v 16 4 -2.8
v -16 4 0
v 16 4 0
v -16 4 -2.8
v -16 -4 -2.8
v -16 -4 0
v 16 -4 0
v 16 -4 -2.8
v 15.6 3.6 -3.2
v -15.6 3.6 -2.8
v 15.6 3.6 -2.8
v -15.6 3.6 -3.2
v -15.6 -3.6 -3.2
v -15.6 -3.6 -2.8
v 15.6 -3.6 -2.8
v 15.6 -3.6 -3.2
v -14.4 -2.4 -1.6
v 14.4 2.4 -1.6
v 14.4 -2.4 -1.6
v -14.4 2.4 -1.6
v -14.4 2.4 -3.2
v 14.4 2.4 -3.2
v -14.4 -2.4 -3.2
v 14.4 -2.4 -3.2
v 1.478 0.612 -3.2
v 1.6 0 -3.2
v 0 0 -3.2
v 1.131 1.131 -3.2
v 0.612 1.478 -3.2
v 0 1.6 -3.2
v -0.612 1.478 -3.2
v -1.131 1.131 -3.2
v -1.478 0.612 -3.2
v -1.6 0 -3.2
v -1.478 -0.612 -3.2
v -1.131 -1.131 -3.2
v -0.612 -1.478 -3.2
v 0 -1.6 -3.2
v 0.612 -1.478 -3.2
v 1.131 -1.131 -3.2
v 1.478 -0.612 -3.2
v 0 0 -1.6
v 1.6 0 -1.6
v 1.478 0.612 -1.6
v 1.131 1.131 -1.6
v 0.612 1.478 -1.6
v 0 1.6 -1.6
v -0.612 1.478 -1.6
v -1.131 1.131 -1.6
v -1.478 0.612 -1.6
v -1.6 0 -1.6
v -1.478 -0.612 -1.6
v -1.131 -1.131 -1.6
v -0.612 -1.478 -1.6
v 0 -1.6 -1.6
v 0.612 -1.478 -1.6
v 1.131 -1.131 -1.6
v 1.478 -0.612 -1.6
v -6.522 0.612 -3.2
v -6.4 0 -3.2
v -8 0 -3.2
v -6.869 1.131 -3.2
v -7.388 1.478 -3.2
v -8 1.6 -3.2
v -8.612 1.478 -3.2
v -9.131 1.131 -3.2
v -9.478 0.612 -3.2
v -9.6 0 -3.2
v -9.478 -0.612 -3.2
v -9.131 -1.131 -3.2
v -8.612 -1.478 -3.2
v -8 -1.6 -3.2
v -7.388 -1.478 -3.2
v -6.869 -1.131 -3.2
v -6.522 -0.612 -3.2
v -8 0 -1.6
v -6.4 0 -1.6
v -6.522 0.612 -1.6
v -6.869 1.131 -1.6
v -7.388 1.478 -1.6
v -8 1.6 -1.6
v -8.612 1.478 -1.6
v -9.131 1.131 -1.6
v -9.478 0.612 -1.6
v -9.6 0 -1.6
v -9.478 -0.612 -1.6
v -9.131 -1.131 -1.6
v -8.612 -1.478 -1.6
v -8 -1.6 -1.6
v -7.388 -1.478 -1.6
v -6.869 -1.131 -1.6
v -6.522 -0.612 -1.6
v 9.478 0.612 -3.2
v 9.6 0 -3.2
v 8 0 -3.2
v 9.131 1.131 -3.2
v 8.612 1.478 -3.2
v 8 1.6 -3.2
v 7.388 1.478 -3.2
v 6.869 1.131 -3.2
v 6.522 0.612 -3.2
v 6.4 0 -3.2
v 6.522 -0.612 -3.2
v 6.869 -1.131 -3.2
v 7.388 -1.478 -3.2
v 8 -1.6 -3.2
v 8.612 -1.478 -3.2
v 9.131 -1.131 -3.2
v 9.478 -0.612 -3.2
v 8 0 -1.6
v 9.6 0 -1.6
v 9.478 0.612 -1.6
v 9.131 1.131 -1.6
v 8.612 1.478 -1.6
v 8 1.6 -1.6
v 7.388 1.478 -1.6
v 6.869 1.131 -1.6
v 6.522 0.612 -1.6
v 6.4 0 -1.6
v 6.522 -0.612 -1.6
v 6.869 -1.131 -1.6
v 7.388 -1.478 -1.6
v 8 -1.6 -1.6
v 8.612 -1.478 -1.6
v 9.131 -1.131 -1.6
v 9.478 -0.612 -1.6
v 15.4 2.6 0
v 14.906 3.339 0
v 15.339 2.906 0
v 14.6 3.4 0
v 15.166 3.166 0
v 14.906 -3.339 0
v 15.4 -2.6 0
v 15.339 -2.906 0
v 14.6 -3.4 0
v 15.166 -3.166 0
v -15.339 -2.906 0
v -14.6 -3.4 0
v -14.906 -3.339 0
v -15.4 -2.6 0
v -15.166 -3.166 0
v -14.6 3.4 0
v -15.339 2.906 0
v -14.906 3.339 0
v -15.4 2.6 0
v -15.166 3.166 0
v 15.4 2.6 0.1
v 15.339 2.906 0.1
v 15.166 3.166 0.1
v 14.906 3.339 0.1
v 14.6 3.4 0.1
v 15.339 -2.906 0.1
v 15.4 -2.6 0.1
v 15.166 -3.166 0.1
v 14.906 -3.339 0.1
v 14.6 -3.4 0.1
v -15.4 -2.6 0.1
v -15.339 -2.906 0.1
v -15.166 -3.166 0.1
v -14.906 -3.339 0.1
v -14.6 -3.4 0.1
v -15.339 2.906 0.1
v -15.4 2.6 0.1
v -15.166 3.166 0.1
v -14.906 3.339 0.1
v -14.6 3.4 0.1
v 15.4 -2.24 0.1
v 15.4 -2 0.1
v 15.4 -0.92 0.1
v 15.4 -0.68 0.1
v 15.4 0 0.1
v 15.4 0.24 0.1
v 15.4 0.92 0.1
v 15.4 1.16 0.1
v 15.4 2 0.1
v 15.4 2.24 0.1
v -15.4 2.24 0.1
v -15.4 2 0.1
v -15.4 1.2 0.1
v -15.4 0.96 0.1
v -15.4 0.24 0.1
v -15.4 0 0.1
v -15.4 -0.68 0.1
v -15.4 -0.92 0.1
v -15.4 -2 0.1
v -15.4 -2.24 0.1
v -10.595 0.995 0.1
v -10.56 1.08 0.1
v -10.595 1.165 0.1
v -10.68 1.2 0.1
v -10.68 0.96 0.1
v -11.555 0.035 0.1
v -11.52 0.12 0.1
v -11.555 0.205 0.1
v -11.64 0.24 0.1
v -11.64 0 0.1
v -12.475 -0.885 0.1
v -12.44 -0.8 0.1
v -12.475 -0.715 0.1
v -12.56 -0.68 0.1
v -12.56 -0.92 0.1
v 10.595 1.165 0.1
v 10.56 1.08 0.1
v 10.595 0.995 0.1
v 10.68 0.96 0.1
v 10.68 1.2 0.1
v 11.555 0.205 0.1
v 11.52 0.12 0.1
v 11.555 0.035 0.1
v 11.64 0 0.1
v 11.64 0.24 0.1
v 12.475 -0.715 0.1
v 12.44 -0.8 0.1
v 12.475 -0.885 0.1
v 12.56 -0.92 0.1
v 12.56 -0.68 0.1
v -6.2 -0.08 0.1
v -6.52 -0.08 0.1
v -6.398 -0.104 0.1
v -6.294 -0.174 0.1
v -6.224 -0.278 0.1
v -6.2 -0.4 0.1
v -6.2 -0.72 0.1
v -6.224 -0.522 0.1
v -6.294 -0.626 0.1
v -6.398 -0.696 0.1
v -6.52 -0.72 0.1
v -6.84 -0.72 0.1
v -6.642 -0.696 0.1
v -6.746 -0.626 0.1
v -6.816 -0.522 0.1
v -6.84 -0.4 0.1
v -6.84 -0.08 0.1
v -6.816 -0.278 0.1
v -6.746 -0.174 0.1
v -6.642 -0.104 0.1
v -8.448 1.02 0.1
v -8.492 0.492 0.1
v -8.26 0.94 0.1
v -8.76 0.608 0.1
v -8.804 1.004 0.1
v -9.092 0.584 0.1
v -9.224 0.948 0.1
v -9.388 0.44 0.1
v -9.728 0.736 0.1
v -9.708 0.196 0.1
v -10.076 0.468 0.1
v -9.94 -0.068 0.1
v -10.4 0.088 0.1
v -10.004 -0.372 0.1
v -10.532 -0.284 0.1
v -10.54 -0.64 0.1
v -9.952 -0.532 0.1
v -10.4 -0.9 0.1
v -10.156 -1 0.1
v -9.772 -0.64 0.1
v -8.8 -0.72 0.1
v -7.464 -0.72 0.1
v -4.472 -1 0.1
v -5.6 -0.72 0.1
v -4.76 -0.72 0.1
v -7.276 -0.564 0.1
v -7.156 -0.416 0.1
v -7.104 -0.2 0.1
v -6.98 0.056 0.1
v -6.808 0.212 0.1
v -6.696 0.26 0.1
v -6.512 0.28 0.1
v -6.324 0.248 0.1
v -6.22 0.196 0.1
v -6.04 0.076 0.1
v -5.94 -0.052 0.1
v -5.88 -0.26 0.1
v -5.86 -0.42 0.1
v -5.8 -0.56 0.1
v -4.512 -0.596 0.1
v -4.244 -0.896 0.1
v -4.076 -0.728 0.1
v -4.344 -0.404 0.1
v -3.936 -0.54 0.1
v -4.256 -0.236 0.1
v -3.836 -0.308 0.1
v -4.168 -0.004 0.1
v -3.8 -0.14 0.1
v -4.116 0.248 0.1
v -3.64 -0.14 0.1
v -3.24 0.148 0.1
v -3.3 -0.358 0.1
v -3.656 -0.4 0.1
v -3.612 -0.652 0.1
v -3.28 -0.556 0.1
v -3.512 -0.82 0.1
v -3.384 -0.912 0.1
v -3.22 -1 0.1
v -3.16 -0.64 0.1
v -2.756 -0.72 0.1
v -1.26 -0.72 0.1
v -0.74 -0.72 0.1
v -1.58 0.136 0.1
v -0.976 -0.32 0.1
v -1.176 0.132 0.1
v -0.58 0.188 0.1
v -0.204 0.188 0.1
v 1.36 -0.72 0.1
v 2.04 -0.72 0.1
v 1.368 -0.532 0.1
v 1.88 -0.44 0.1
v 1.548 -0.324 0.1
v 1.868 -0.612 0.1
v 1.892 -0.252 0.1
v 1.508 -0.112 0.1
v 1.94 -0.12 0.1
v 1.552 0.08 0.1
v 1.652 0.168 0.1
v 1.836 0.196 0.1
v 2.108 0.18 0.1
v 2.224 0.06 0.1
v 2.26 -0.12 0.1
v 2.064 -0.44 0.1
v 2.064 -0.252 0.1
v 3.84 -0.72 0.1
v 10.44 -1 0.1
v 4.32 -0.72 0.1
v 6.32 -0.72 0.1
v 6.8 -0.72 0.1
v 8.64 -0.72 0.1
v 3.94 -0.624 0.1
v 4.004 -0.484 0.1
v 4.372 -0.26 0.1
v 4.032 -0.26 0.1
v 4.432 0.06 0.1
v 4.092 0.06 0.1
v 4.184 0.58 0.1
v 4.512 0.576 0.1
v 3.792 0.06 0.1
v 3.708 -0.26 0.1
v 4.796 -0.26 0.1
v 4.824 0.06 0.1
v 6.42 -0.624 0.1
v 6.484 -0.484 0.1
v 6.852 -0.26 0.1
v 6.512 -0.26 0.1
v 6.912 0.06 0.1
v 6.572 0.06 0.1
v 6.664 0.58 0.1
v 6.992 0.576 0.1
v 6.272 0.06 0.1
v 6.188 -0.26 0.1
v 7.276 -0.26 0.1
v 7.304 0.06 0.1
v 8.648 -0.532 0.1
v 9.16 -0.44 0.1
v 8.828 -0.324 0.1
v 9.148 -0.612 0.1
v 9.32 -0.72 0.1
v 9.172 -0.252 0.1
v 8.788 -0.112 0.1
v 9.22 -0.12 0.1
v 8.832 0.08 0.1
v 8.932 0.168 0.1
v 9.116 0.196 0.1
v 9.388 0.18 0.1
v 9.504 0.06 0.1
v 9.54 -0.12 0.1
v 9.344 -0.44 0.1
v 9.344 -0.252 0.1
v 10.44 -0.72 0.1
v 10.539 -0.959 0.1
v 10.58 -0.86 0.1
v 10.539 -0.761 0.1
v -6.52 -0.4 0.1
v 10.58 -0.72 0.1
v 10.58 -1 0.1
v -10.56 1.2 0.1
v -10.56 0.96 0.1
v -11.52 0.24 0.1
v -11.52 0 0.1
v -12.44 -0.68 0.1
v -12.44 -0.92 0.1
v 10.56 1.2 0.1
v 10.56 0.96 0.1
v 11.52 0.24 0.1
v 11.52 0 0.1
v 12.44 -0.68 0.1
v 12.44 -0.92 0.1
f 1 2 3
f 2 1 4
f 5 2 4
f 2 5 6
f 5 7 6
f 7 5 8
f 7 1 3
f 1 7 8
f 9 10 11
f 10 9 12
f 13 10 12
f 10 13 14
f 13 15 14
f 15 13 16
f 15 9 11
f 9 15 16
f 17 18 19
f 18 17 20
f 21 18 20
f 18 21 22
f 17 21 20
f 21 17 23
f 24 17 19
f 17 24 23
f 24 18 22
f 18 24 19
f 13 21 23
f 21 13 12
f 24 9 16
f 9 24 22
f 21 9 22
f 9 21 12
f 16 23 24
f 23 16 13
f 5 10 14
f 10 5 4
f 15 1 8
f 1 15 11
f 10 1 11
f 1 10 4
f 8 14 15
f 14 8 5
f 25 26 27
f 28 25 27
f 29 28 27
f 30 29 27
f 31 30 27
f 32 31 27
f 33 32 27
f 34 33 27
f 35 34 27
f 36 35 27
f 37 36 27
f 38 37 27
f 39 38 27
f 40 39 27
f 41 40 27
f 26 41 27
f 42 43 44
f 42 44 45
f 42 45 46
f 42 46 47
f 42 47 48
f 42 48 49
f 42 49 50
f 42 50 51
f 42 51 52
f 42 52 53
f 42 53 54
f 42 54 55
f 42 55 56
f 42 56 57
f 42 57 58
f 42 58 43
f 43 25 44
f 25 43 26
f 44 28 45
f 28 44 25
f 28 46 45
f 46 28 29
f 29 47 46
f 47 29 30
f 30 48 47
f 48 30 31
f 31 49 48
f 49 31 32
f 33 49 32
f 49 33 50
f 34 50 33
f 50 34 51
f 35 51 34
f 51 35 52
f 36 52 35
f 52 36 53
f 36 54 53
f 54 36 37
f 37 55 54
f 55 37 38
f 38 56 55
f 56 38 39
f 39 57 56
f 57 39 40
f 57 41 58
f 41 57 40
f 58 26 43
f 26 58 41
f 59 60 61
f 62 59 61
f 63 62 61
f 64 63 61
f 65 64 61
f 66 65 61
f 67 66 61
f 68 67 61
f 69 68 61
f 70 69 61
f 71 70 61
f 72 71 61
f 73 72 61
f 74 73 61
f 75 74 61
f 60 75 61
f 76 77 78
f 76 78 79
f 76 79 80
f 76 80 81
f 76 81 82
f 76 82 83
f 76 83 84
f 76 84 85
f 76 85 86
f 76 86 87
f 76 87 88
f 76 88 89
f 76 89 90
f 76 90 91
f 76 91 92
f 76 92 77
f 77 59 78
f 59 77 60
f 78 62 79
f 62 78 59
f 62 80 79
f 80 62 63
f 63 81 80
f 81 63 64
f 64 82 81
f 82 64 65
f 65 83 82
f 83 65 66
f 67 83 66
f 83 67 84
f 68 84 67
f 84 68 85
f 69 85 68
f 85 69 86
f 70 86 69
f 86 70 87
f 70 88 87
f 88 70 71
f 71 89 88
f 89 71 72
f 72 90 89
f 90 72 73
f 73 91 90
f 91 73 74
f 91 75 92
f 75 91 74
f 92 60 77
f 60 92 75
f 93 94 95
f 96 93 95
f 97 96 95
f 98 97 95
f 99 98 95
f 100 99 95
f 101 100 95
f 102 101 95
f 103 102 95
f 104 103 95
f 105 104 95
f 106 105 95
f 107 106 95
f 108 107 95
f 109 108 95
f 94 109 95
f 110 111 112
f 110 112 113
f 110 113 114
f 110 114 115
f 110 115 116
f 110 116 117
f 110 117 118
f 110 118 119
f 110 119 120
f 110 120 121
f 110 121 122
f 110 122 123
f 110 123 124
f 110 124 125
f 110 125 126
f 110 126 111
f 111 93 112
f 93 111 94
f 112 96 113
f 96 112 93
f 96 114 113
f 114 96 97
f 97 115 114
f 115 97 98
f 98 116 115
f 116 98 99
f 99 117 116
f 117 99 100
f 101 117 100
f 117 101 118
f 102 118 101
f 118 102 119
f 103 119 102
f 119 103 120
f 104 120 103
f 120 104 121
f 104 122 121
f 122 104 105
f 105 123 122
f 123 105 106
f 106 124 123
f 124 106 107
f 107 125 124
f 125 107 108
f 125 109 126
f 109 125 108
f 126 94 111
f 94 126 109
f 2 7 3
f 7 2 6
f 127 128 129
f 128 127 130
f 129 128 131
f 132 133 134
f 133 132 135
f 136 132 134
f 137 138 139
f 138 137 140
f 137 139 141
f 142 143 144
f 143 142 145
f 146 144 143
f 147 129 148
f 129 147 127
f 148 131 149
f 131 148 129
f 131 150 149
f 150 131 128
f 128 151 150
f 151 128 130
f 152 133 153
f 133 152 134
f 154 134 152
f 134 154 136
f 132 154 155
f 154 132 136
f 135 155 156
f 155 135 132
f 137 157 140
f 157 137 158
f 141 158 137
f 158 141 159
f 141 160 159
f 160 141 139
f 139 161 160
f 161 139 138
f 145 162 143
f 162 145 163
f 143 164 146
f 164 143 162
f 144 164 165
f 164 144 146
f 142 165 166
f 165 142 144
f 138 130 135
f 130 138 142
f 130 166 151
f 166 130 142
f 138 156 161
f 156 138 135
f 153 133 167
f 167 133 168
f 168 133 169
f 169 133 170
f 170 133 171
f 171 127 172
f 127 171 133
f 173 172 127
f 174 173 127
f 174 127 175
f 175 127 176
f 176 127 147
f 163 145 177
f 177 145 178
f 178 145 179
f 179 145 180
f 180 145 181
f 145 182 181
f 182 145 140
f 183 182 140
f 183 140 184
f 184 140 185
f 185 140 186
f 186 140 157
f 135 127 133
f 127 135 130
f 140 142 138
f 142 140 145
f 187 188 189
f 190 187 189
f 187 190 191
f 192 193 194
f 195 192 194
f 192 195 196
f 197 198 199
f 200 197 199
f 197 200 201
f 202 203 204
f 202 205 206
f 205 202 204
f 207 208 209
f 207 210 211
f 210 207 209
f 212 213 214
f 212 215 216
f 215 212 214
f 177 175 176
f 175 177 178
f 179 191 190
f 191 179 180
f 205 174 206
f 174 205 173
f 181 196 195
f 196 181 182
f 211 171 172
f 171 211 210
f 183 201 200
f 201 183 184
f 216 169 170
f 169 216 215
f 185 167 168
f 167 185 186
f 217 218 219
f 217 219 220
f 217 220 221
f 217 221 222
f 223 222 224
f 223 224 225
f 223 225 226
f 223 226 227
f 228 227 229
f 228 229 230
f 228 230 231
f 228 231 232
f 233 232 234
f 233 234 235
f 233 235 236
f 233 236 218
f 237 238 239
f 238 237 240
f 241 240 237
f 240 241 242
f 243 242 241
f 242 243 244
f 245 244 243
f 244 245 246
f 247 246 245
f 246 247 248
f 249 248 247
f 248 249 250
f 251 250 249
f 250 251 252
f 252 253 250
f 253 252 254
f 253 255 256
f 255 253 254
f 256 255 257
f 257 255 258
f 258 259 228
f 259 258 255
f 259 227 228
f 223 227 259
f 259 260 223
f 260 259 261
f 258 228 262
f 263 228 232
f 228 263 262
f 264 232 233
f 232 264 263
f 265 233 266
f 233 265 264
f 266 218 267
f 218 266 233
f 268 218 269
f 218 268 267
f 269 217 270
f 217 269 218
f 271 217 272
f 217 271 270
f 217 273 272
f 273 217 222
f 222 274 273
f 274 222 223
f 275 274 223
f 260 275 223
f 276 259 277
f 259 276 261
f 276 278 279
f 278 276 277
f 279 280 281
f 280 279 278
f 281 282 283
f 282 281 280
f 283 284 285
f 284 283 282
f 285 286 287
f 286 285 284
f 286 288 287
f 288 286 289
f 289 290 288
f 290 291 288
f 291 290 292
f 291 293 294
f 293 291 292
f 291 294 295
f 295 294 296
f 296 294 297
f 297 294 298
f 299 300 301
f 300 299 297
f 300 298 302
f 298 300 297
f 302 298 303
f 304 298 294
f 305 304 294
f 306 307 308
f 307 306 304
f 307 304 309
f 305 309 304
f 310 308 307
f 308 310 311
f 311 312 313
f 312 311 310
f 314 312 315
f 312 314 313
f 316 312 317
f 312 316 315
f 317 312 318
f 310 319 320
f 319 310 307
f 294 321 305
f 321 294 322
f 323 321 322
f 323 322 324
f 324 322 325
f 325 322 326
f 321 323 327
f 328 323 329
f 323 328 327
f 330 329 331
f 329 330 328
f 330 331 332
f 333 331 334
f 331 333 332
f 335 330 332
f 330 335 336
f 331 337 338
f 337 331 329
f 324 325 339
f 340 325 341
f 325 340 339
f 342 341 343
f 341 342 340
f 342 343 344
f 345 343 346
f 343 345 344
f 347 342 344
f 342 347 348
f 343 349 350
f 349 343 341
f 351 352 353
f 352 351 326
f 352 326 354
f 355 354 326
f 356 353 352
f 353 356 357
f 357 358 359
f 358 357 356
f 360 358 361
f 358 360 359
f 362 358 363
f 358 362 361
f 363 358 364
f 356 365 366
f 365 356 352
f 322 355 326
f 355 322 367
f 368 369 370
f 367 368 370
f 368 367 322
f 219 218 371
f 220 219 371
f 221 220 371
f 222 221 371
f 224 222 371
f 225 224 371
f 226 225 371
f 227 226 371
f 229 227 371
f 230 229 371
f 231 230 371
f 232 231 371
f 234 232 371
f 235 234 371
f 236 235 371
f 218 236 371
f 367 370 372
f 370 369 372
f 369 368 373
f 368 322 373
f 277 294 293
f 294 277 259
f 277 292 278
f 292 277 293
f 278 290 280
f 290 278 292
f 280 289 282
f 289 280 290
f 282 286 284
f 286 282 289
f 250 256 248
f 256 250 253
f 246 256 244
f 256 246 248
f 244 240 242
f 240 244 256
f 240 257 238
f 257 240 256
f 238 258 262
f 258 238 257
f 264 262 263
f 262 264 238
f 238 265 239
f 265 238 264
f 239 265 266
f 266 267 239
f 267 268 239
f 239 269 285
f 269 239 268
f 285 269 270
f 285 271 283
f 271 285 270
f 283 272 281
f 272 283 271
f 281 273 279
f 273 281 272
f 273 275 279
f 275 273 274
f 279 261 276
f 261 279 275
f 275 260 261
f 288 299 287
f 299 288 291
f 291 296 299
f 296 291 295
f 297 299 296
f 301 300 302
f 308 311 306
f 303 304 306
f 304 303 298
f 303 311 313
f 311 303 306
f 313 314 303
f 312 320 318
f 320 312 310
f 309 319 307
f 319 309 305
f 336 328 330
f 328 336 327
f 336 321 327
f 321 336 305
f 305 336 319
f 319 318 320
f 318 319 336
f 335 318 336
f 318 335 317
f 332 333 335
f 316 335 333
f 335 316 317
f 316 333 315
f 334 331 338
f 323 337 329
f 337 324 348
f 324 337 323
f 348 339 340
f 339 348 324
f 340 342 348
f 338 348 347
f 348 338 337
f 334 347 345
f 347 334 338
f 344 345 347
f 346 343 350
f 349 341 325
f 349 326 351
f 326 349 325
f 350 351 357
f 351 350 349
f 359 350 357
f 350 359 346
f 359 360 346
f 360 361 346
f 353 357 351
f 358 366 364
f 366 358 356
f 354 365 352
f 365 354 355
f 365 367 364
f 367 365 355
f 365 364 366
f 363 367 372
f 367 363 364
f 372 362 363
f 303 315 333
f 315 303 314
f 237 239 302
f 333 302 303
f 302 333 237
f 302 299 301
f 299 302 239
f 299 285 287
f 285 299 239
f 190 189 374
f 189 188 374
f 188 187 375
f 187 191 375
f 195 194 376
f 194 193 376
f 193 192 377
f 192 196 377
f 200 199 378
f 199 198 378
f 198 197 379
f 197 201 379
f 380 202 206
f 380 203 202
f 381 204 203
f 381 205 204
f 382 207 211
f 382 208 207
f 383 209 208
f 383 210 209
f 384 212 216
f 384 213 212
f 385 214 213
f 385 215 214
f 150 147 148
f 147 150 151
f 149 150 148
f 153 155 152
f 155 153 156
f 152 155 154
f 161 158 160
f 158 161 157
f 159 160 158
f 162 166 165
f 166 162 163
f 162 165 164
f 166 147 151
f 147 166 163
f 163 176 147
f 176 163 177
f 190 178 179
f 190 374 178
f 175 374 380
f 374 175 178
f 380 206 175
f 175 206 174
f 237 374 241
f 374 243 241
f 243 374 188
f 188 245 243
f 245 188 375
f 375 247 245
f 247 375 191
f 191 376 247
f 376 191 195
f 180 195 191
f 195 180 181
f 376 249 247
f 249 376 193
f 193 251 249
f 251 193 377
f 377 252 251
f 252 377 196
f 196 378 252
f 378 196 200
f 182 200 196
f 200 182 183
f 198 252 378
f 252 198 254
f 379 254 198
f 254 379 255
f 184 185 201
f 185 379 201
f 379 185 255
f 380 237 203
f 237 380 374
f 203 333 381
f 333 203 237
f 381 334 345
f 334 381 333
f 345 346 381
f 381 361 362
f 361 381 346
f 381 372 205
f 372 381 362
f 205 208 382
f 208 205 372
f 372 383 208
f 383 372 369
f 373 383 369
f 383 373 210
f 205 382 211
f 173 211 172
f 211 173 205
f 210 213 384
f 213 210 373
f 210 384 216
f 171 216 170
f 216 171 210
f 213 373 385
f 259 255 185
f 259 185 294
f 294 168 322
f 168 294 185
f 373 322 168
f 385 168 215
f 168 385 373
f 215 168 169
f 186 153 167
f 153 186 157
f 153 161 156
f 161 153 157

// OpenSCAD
use <../lib.scad>
use <2431.scad>
use <6451314e.scad>
function ldraw_lib__2431d11() = [
// 0 Tile  1 x  4 with Dark Bluish Grey "Corvette" on Light Bluish Grey Background Sticker
// 0 Name: 2431d11.dat
// 0 Author: Vincent Messenet [Cheenzo]
// 0 !LDRAW_ORG Shortcut UPDATE 2026-06
// 0 !LICENSE Licensed under CC BY 4.0 : see CAreadme.txt
// 
// 0 BFC CERTIFY CCW
  [0,"BFC","CERTIFY"],
  [0,"BFC","CCW"],
// 
// 0 !CATEGORY Sticker Shortcut
// 
// 0 !KEYWORDS Bricklink Chevrolet, Icons, Set 10321
// 
// 0 !HISTORY 2026-06-28 [OrionP] Official Update 2026-06
// 
// 1 16 0 0 0 1 0 0 0 1 0 0 0 1 2431.dat
  [1,16,0,0,0,1,0,0,0,1,0,0,0,1, ldraw_lib__2431()],
// 1 16 0 0 0 1 0 0 0 1 0 0 0 1 6451314e.dat
  [1,16,0,0,0,1,0,0,0,1,0,0,0,1, ldraw_lib__6451314e()],
];
module ldraw_lib__2431d11(step=0, col=false, unit=2/5, alt=false, line=0.2, solid=!$preview)
    makepoly(ldraw_lib__2431d11(), step=step, col=col, unit=unit, alt=alt, line=line, solid=solid);
ldraw_lib__2431d11(line=0.2);
